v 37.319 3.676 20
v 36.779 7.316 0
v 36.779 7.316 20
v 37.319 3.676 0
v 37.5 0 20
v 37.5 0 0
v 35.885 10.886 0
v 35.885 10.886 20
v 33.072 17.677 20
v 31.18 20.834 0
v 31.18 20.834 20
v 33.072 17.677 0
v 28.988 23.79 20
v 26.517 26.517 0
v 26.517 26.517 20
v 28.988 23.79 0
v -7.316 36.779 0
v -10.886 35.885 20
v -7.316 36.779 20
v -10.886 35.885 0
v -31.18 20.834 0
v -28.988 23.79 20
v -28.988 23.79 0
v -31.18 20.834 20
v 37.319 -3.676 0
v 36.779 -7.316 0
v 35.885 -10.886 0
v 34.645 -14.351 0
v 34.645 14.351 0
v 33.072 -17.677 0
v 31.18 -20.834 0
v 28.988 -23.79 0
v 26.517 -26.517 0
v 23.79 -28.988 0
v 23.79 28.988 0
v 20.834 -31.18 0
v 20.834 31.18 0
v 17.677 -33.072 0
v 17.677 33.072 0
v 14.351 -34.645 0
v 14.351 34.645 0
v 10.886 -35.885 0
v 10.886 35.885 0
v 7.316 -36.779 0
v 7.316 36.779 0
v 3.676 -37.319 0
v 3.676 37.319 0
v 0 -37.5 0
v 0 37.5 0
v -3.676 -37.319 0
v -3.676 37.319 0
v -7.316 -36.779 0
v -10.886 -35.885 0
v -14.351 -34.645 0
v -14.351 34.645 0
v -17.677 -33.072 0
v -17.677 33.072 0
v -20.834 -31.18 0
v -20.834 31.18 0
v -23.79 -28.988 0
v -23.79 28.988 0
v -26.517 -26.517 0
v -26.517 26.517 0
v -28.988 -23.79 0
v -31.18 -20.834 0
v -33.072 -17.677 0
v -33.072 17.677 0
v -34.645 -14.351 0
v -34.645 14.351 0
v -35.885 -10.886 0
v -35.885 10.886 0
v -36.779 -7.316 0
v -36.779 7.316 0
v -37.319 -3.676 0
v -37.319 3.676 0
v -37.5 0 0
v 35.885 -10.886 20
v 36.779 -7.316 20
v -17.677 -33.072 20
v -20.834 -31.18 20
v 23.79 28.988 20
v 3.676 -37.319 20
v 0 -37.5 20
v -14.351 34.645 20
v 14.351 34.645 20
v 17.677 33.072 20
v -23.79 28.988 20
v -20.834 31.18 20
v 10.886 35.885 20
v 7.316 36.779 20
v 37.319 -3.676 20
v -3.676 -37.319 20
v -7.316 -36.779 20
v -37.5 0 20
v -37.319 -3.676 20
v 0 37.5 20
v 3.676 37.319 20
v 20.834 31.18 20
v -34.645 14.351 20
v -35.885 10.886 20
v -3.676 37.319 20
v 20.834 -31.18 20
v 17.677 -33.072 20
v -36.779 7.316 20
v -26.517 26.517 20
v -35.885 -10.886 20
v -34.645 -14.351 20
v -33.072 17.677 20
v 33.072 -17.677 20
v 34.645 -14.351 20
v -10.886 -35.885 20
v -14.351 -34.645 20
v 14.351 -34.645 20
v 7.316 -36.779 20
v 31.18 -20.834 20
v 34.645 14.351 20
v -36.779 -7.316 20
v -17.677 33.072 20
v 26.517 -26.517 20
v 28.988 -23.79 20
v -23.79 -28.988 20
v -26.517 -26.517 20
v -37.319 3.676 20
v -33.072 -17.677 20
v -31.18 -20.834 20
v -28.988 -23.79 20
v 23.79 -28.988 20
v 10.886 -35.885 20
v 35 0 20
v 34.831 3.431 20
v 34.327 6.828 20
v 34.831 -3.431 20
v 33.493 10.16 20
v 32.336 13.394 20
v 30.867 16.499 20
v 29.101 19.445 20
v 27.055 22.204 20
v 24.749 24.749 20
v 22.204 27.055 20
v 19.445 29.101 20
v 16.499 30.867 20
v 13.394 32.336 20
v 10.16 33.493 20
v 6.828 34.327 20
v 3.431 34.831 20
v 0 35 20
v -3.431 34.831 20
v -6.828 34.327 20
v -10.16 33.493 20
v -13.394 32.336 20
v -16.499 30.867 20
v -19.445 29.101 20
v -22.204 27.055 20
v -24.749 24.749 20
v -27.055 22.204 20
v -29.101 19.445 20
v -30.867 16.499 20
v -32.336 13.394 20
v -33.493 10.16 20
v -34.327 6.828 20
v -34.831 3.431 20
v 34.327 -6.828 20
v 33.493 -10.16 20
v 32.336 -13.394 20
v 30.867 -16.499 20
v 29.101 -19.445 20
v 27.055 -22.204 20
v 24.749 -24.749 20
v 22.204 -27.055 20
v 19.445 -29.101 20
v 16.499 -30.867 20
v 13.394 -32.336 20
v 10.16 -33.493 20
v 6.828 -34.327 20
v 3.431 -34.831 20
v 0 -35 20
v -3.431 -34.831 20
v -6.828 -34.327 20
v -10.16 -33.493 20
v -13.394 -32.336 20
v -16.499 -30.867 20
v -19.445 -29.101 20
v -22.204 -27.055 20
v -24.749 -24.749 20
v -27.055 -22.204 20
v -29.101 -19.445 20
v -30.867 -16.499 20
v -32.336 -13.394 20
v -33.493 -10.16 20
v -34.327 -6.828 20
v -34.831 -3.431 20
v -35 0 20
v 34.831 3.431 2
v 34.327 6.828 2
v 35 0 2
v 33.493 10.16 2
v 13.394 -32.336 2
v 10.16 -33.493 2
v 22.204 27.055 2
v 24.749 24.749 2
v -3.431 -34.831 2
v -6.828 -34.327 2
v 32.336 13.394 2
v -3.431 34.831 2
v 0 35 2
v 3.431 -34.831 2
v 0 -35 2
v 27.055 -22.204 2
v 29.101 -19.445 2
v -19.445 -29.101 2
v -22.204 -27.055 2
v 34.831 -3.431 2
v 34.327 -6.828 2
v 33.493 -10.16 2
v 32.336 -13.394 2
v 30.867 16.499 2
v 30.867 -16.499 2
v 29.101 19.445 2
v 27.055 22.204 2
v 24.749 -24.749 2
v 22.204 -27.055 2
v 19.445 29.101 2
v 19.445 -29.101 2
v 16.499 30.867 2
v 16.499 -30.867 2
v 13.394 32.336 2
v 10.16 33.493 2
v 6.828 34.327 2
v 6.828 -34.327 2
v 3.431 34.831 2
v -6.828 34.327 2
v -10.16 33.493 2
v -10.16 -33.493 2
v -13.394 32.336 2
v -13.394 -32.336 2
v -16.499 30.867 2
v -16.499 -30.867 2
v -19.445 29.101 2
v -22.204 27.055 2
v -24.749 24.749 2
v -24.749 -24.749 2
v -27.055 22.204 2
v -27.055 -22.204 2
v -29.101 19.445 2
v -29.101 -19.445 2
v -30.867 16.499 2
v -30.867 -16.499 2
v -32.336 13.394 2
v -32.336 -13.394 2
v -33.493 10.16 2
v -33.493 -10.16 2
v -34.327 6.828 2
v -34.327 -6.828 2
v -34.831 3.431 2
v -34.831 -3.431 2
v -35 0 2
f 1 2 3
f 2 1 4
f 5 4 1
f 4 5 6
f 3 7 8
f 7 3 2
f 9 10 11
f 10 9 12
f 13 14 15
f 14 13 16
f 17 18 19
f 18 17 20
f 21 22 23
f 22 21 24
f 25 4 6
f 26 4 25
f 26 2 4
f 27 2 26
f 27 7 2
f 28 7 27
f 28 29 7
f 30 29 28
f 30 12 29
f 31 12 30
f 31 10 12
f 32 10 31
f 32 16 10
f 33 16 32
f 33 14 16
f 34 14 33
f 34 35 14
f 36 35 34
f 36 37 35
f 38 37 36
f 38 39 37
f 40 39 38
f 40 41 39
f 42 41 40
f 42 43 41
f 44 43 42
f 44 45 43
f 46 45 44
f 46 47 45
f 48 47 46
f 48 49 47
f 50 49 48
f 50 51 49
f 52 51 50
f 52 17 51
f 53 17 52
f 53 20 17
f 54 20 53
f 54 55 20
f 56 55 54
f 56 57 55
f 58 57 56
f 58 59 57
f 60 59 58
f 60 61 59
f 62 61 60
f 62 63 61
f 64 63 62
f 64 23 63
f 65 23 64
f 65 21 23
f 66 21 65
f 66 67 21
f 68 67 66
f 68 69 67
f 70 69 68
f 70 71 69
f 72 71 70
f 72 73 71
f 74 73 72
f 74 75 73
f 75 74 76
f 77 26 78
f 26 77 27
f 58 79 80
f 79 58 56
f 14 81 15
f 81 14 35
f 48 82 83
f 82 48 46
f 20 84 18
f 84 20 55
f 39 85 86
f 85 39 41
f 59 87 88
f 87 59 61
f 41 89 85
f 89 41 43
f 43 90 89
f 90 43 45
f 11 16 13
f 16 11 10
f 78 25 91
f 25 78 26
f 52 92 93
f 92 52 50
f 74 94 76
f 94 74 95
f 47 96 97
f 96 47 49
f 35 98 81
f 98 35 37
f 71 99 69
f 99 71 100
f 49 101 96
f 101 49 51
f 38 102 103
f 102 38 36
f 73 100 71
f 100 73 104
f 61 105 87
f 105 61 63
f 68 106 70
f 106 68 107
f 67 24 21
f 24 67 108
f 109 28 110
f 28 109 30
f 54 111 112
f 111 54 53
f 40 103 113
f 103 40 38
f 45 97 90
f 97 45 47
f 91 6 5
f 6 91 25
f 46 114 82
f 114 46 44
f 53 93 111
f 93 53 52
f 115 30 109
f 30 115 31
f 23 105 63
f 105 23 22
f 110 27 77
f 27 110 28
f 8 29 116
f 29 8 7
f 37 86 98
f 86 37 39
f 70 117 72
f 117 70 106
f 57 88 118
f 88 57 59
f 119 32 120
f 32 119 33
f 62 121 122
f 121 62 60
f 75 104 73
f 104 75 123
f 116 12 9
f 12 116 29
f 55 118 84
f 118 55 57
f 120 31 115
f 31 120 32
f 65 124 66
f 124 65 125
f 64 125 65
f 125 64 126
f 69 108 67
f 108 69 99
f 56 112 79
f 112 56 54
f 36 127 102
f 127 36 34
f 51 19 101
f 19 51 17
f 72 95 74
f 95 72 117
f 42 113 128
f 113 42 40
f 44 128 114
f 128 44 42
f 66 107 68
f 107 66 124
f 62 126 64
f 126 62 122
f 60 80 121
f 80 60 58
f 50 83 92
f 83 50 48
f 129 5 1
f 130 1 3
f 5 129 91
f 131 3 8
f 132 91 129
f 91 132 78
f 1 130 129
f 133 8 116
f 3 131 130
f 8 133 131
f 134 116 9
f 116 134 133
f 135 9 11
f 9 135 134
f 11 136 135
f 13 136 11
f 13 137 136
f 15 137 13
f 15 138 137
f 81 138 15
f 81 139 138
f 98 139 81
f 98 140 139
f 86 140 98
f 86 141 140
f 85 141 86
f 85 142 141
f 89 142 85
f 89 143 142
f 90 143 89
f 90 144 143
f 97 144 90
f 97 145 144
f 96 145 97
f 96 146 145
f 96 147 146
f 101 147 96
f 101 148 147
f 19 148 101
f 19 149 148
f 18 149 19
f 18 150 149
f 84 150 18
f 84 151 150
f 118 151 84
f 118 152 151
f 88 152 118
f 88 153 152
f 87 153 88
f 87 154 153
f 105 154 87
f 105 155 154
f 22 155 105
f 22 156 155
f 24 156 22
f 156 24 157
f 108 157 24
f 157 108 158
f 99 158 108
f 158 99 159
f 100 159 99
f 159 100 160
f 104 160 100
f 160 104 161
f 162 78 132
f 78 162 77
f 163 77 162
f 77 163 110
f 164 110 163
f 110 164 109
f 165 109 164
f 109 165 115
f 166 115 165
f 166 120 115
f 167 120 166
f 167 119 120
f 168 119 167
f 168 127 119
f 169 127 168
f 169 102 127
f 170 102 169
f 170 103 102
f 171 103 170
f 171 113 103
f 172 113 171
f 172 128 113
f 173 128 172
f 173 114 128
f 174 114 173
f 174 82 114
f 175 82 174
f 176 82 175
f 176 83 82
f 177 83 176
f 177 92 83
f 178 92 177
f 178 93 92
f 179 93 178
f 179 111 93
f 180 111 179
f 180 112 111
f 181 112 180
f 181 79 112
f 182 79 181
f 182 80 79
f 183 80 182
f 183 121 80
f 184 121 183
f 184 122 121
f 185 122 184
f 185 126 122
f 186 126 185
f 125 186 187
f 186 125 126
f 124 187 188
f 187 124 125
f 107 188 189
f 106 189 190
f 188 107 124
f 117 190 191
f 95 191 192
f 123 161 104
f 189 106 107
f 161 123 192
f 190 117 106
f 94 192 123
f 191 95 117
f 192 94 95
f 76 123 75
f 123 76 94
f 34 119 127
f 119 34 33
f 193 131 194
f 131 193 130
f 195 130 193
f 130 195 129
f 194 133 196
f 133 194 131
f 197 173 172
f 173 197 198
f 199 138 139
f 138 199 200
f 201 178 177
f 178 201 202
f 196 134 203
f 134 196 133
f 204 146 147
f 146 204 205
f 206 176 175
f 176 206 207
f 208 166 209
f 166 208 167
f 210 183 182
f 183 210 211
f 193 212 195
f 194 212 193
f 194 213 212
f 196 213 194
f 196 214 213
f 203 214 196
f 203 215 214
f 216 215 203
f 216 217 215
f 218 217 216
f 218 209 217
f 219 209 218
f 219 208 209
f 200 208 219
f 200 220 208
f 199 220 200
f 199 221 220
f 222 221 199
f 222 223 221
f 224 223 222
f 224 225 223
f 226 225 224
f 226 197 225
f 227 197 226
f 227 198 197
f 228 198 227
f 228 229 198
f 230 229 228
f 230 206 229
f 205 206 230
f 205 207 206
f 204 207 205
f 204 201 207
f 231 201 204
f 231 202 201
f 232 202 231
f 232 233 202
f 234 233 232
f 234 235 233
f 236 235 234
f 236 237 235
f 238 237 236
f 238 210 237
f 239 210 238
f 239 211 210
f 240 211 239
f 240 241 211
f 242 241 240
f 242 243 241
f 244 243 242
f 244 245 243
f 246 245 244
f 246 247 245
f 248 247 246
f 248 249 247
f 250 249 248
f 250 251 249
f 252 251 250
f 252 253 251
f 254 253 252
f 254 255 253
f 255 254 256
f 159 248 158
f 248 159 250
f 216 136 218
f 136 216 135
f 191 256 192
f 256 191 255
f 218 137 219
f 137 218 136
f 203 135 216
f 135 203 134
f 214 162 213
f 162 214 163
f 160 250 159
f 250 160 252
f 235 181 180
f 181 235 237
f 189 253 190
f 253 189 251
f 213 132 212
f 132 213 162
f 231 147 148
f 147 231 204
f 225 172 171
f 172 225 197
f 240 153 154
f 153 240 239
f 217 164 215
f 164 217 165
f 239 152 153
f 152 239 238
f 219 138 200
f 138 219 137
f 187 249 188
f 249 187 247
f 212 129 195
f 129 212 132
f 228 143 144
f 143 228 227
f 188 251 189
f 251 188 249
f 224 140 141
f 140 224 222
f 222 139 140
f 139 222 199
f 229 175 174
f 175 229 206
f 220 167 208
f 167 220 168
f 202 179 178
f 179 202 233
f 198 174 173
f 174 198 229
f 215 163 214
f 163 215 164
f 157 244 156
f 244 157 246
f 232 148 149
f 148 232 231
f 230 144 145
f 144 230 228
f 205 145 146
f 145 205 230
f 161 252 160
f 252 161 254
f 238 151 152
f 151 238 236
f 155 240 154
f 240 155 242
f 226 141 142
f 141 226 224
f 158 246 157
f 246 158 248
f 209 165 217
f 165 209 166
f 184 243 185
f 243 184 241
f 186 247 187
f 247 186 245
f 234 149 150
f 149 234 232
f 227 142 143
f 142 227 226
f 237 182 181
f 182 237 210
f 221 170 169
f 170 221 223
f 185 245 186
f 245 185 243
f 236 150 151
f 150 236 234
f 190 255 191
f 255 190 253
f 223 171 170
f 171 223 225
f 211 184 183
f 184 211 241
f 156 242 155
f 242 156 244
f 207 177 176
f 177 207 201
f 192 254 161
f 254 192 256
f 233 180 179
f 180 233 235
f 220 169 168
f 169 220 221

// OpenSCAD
module ht_75_cap() {
    difference() {
        // Outer cap
        cylinder(h=20, r=37.5, $fn=64);
        // Inner hollow part
        translate([0, 0, 2])
            cylinder(h=18, r=35, $fn=64);
    }
}

ht_75_cap();
